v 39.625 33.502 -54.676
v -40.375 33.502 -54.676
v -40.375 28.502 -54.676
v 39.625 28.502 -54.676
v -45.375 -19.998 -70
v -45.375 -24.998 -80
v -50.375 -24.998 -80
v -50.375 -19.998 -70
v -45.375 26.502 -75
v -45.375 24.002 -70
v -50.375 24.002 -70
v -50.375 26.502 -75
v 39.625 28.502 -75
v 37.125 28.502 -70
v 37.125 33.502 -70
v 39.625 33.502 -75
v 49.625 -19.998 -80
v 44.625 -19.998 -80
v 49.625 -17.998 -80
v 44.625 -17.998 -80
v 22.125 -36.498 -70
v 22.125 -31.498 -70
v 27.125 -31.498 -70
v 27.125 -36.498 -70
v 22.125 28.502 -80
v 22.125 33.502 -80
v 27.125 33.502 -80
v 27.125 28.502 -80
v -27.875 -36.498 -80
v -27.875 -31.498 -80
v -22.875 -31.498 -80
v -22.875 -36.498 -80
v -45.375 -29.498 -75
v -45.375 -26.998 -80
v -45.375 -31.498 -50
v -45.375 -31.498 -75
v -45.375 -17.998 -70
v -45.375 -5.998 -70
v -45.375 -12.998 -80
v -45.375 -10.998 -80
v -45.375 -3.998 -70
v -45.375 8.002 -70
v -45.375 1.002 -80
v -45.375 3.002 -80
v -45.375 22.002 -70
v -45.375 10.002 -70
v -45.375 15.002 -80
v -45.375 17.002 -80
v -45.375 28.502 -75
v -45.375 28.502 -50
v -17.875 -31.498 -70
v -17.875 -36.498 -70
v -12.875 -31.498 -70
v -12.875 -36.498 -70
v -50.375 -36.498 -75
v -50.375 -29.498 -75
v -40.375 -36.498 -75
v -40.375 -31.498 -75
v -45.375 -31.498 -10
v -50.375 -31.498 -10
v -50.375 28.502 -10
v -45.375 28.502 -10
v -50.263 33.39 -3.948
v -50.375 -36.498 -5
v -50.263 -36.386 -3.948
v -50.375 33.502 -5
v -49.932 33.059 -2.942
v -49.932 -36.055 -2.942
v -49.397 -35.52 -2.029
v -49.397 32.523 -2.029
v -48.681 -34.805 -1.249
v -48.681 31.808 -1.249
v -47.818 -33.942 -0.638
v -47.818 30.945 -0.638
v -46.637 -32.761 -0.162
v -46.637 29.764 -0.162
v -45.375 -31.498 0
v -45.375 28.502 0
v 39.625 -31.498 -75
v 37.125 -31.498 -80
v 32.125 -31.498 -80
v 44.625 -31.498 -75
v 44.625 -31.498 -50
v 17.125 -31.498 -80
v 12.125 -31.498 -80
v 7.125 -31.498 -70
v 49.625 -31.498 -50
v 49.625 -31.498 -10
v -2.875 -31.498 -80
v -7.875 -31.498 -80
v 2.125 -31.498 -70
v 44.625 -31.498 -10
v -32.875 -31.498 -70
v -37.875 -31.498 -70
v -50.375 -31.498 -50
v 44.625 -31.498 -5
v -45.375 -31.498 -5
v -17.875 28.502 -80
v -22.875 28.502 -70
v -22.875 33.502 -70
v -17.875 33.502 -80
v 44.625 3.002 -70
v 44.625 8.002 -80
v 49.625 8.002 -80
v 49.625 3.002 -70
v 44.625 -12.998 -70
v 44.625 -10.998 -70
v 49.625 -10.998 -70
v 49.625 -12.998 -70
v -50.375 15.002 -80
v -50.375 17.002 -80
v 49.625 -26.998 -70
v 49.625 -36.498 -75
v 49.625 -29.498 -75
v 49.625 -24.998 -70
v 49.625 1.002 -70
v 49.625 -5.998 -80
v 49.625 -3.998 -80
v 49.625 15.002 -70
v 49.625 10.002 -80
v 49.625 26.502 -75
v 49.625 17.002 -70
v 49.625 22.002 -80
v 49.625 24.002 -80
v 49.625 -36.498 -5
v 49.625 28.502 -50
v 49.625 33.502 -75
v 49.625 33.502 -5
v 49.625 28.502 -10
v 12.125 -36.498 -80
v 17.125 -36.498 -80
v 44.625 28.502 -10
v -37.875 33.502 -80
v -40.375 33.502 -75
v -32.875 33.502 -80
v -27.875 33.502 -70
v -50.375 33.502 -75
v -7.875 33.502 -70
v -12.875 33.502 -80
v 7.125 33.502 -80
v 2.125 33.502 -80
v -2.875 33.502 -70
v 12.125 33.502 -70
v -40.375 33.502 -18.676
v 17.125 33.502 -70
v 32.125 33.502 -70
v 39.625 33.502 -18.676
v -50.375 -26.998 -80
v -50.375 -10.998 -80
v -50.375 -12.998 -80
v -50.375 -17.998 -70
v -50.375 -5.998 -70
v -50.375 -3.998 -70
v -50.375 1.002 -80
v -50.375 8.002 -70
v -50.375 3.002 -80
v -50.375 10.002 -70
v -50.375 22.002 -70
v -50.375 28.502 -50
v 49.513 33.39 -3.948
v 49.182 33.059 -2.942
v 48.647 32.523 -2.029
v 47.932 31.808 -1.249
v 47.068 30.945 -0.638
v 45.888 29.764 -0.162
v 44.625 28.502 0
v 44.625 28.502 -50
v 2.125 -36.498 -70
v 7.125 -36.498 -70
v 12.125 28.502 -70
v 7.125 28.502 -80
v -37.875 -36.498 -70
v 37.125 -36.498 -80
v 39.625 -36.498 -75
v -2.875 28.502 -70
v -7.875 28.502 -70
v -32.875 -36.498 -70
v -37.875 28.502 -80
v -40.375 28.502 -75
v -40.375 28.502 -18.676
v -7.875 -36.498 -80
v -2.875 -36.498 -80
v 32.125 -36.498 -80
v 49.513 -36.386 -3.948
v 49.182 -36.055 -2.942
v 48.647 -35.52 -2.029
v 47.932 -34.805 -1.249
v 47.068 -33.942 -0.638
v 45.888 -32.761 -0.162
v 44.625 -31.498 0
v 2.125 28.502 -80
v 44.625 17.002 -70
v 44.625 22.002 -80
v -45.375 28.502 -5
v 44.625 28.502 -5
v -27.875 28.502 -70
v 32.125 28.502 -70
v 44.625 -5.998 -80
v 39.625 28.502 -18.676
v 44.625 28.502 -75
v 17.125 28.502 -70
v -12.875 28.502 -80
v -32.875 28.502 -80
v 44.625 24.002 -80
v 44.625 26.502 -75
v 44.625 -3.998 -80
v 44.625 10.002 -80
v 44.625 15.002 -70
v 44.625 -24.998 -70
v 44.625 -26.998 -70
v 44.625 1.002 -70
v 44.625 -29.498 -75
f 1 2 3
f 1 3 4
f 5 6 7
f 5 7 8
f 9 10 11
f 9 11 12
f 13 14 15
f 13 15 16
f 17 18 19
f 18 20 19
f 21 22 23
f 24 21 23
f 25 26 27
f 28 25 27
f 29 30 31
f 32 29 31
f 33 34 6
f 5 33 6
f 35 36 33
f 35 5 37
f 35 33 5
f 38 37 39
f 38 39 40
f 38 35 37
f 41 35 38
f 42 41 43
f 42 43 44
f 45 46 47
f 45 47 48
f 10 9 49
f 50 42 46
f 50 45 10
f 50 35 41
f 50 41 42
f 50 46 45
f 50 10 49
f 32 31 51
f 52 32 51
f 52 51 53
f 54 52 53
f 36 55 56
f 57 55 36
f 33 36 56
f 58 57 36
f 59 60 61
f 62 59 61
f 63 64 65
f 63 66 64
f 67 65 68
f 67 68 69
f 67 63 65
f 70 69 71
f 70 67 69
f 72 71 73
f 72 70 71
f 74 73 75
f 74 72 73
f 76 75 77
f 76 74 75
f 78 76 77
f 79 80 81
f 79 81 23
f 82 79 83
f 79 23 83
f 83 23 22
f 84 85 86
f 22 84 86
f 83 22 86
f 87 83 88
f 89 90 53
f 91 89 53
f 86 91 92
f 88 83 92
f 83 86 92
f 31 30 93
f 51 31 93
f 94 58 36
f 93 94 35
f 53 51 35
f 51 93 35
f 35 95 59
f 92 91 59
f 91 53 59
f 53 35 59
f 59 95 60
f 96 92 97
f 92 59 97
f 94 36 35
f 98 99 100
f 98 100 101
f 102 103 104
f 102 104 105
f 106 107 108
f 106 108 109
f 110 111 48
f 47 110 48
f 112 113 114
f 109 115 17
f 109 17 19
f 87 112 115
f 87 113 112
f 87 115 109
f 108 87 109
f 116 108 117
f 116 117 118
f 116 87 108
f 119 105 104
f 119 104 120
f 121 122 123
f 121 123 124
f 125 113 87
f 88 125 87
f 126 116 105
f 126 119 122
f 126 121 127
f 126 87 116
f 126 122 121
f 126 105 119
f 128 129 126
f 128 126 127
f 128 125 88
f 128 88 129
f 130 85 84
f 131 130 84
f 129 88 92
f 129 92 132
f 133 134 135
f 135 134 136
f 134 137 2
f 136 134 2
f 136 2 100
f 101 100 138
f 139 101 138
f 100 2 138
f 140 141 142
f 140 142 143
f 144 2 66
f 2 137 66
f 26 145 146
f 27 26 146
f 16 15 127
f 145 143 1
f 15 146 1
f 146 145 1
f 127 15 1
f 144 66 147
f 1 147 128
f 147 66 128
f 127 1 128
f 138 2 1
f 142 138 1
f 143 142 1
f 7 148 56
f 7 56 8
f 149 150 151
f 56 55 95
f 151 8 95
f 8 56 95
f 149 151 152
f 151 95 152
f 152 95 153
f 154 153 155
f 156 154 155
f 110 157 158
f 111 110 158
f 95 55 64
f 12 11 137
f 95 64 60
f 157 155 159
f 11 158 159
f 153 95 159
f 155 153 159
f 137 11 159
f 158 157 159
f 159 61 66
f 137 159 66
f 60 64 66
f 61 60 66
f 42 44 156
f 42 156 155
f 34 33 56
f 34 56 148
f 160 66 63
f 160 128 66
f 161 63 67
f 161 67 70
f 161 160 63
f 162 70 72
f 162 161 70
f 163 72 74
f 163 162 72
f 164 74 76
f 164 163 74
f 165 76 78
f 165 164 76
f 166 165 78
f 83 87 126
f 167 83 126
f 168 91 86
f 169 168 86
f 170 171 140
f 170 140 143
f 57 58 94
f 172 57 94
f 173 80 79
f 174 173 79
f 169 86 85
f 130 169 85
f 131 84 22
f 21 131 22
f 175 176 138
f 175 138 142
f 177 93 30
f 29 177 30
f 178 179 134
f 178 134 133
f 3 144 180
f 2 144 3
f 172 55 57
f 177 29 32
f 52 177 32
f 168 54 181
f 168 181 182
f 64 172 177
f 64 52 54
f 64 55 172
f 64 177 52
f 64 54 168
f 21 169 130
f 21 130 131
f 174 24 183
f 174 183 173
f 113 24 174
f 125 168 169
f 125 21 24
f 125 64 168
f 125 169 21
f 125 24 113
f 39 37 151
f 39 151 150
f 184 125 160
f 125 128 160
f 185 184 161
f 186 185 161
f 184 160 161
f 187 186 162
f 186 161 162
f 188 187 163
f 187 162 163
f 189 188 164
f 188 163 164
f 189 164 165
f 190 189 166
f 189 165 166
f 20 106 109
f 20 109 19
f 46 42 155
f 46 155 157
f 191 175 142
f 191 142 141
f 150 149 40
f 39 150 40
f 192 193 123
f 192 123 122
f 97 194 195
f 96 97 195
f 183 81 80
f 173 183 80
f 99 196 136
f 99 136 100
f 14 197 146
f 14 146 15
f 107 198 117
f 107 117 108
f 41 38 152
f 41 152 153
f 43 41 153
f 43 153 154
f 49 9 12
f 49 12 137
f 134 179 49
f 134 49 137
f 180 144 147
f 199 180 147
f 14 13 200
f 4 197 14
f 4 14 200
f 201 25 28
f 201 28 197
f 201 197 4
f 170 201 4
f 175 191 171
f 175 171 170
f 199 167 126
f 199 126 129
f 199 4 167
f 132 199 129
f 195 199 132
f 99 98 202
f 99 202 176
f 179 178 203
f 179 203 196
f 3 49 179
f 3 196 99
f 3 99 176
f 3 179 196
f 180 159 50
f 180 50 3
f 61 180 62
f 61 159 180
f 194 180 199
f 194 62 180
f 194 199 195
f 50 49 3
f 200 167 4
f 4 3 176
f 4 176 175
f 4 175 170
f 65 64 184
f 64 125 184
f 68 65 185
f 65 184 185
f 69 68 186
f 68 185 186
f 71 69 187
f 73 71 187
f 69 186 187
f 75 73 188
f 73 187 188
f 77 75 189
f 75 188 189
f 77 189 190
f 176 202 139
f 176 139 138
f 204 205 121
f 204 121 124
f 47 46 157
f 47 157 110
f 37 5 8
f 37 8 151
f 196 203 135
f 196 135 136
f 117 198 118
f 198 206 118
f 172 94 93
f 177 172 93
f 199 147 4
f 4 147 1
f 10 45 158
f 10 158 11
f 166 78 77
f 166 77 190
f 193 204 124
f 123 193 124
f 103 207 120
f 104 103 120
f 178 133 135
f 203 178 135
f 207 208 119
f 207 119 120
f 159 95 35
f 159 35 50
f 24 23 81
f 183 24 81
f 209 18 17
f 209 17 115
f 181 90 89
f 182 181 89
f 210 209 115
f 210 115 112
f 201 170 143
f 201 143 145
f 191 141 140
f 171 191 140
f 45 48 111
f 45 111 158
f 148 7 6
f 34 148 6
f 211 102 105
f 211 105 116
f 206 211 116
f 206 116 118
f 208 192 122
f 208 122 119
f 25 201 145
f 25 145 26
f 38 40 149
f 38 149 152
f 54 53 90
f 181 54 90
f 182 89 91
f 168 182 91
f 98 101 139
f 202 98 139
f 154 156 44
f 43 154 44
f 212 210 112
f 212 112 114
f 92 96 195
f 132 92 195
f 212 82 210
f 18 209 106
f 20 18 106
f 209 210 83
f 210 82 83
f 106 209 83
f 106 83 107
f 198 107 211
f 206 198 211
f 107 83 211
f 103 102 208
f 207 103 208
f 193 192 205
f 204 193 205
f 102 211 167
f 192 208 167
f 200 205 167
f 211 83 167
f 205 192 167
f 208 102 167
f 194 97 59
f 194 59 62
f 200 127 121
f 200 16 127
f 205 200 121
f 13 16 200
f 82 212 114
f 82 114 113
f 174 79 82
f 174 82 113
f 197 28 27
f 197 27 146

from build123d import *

# Parameters (mm, degrees)
SKETCH1_W               = 100
SKETCH1_H               = 70
BOSS_EXTRUDE1_DEPTH     = 80
FILLET2_R               = 5
CUT_EXTRUDE1_START      = -5
SKETCH3_W               = 90
SKETCH3_H               = 60
CUT_EXTRUDE1_DEPTH      = 75
SKETCH2_W               = 40
SKETCH2_H               = 60
CUT_EXTRUDE2_DEPTH      = 5
SKETCH4_W               = 40
SKETCH4_H               = 60
CUT_EXTRUDE3_DEPTH      = 5
CUT_EXTRUDE4_START      = -5
CUT_EXTRUDE4_DEPTH      = 5
CUT_EXTRUDE5_START      = -5
CUT_EXTRUDE5_DEPTH      = 5
CUT_EXTRUDE6_DEPTH      = 118.633373344
CUT_EXTRUDE6_DEPTH_BACK = 5
CUT_EXTRUDE7_DEPTH      = 118.633373344
CUT_EXTRUDE7_DEPTH_BACK = 5
SKETCH9_W               = 80
SKETCH9_H               = 36
CUT_EXTRUDE8_DEPTH      = 5


# Read off the part's stored shape, not the designer's step: Cut-Extrude4, Cut-Extrude5
with BuildPart() as part:
    # Sketch1 → Boss-Extrude1 (new body)
    with BuildSketch(Plane.XY):
        with Locations((-0.374701232, -1.49844749)):
            Rectangle(SKETCH1_W, SKETCH1_H)
    extrude(amount=-BOSS_EXTRUDE1_DEPTH)

    # Fillet2
    fillet2_edges = [part.edges().sort_by_distance(p)[0] for p in [
        (-0.374701232, 33.50155251, 0),
        (49.625298768, -1.49844749, 0),
        (-0.374701232, -36.49844749, 0),
        (-50.374701232, -1.49844749, 0),
    ]]
    fillet(fillet2_edges, radius=FILLET2_R)

    # Sketch3 → Cut-Extrude1 (cut)
    with BuildSketch(Plane.XY.offset(CUT_EXTRUDE1_START)):
        with Locations((-0.374701232, -1.49844749)):
            Rectangle(SKETCH3_W, SKETCH3_H)
    extrude(amount=-CUT_EXTRUDE1_DEPTH, mode=Mode.SUBTRACT)

    # Sketch2 → Cut-Extrude2 (cut)
    with BuildSketch(Plane(origin=(49.625298768, 0, 0), x_dir=(0, 0, -1), z_dir=(1, 0, 0))):
        with Locations((30, -1.49844749)):
            Rectangle(SKETCH2_W, SKETCH2_H)
    extrude(amount=-CUT_EXTRUDE2_DEPTH, mode=Mode.SUBTRACT)

    # Sketch4 → Cut-Extrude3 (cut)
    with BuildSketch(Plane.ZY.offset(50.374701232)):
        with Locations((-30, -1.49844749)):
            Rectangle(SKETCH4_W, SKETCH4_H)
    extrude(amount=-CUT_EXTRUDE3_DEPTH, mode=Mode.SUBTRACT)

    # Cut-Extrude4 outline → Cut-Extrude4 (cut)
    with BuildSketch(Plane(origin=(49.625298768, 0, 0), x_dir=(0, 0, -1), z_dir=(1, 0, 0)).offset(CUT_EXTRUDE4_START)):
        Polygon((80, -19.99844749), (70, -24.99844749), (70, -26.99844749), (75, -29.49844749), (75, -36.49844749), (80, -36.49844749), align=None)
        Polygon((75, 26.50155251), (80, 24.00155251), (80, 33.50155251), (75, 33.50155251), align=None)
        Polygon((70, 15.00155251), (80, 10.00155251), (80, 22.00155251), (70, 17.00155251), align=None)
        Polygon((70, 1.00155251), (80, -3.99844749), (80, 8.00155251), (70, 3.00155251), align=None)
        Polygon((70, -12.99844749), (80, -17.99844749), (80, -5.99844749), (70, -10.99844749), align=None)
    extrude(amount=CUT_EXTRUDE4_DEPTH, mode=Mode.SUBTRACT)

    # Cut-Extrude5 outline → Cut-Extrude5 (cut)
    with BuildSketch(Plane.ZY.offset(50.374701232).offset(CUT_EXTRUDE5_START)):
        Polygon((-80, 17.00155251), (-70, 22.00155251), (-70, 24.00155251), (-75, 26.50155251), (-75, 33.50155251), (-80, 33.50155251), align=None)
        Polygon((-75, -29.49844749), (-80, -26.99844749), (-80, -36.49844749), (-75, -36.49844749), align=None)
        Polygon((-70, -17.99844749), (-80, -12.99844749), (-80, -24.99844749), (-70, -19.99844749), align=None)
        Polygon((-70, -3.99844749), (-80, 1.00155251), (-80, -10.99844749), (-70, -5.99844749), align=None)
        Polygon((-70, 10.00155251), (-80, 15.00155251), (-80, 3.00155251), (-70, 8.00155251), align=None)
    extrude(amount=CUT_EXTRUDE5_DEPTH, mode=Mode.SUBTRACT)

    # Sketch7 → Cut-Extrude6 (cut, two sides: drawn at the far end of the back side and taken through both)
    with BuildSketch(Plane(origin=(0, 33.50155251, 0), x_dir=(1, 0, 0), z_dir=(0, 1, 0)).offset(-CUT_EXTRUDE6_DEPTH_BACK)):
        Polygon((-297.449069971, 75), (-45.374701232, 75), (-40.374701232, 75), (-37.874701232, 80), (-32.874701232, 80), (-27.874701232, 70), (-22.874701232, 70), (-17.874701232, 80), (-12.874701232, 80), (-7.874701232, 70), (-2.874701232, 70), (2.125298768, 80), (7.125298768, 80), (12.125298768, 70), (17.125298768, 70), (22.125298768, 80), (27.125298768, 80), (32.125298768, 70), (37.125298768, 70), (39.625298768, 75), (44.625298768, 75), (296.699667506, 75), (296.699667506, 579.148737476), (-297.449069971, 579.148737476), align=None)
    extrude(amount=CUT_EXTRUDE6_DEPTH + CUT_EXTRUDE6_DEPTH_BACK, mode=Mode.SUBTRACT)

    # Sketch8 → Cut-Extrude7 (cut, two sides: drawn at the far end of the back side and taken through both)
    with BuildSketch(Plane.XZ.offset(36.49844749).offset(-CUT_EXTRUDE7_DEPTH_BACK)):
        Polygon((-297.449069971, -75), (-45.374701232, -75), (-40.374701232, -75), (-37.874701232, -70), (-32.874701232, -70), (-27.874701232, -80), (-22.874701232, -80), (-17.874701232, -70), (-12.874701232, -70), (-7.874701232, -80), (-2.874701232, -80), (2.125298768, -70), (7.125298768, -70), (12.125298768, -80), (17.125298768, -80), (22.125298768, -70), (27.125298768, -70), (32.125298768, -80), (37.125298768, -80), (39.625298768, -75), (44.625298768, -75), (296.699667506, -75), (296.699667506, -579.148737476), (-297.449069971, -579.148737476), align=None)
    extrude(amount=CUT_EXTRUDE7_DEPTH + CUT_EXTRUDE7_DEPTH_BACK, mode=Mode.SUBTRACT)

    # Sketch9 → Cut-Extrude8 (cut)
    with BuildSketch(Plane(origin=(0, 33.50155251, 0), x_dir=(1, 0, 0), z_dir=(0, 1, 0))):
        with Locations((-0.374701232, 36.675611874)):
            Rectangle(SKETCH9_W, SKETCH9_H)
    extrude(amount=-CUT_EXTRUDE8_DEPTH, mode=Mode.SUBTRACT)


solid = part.part
